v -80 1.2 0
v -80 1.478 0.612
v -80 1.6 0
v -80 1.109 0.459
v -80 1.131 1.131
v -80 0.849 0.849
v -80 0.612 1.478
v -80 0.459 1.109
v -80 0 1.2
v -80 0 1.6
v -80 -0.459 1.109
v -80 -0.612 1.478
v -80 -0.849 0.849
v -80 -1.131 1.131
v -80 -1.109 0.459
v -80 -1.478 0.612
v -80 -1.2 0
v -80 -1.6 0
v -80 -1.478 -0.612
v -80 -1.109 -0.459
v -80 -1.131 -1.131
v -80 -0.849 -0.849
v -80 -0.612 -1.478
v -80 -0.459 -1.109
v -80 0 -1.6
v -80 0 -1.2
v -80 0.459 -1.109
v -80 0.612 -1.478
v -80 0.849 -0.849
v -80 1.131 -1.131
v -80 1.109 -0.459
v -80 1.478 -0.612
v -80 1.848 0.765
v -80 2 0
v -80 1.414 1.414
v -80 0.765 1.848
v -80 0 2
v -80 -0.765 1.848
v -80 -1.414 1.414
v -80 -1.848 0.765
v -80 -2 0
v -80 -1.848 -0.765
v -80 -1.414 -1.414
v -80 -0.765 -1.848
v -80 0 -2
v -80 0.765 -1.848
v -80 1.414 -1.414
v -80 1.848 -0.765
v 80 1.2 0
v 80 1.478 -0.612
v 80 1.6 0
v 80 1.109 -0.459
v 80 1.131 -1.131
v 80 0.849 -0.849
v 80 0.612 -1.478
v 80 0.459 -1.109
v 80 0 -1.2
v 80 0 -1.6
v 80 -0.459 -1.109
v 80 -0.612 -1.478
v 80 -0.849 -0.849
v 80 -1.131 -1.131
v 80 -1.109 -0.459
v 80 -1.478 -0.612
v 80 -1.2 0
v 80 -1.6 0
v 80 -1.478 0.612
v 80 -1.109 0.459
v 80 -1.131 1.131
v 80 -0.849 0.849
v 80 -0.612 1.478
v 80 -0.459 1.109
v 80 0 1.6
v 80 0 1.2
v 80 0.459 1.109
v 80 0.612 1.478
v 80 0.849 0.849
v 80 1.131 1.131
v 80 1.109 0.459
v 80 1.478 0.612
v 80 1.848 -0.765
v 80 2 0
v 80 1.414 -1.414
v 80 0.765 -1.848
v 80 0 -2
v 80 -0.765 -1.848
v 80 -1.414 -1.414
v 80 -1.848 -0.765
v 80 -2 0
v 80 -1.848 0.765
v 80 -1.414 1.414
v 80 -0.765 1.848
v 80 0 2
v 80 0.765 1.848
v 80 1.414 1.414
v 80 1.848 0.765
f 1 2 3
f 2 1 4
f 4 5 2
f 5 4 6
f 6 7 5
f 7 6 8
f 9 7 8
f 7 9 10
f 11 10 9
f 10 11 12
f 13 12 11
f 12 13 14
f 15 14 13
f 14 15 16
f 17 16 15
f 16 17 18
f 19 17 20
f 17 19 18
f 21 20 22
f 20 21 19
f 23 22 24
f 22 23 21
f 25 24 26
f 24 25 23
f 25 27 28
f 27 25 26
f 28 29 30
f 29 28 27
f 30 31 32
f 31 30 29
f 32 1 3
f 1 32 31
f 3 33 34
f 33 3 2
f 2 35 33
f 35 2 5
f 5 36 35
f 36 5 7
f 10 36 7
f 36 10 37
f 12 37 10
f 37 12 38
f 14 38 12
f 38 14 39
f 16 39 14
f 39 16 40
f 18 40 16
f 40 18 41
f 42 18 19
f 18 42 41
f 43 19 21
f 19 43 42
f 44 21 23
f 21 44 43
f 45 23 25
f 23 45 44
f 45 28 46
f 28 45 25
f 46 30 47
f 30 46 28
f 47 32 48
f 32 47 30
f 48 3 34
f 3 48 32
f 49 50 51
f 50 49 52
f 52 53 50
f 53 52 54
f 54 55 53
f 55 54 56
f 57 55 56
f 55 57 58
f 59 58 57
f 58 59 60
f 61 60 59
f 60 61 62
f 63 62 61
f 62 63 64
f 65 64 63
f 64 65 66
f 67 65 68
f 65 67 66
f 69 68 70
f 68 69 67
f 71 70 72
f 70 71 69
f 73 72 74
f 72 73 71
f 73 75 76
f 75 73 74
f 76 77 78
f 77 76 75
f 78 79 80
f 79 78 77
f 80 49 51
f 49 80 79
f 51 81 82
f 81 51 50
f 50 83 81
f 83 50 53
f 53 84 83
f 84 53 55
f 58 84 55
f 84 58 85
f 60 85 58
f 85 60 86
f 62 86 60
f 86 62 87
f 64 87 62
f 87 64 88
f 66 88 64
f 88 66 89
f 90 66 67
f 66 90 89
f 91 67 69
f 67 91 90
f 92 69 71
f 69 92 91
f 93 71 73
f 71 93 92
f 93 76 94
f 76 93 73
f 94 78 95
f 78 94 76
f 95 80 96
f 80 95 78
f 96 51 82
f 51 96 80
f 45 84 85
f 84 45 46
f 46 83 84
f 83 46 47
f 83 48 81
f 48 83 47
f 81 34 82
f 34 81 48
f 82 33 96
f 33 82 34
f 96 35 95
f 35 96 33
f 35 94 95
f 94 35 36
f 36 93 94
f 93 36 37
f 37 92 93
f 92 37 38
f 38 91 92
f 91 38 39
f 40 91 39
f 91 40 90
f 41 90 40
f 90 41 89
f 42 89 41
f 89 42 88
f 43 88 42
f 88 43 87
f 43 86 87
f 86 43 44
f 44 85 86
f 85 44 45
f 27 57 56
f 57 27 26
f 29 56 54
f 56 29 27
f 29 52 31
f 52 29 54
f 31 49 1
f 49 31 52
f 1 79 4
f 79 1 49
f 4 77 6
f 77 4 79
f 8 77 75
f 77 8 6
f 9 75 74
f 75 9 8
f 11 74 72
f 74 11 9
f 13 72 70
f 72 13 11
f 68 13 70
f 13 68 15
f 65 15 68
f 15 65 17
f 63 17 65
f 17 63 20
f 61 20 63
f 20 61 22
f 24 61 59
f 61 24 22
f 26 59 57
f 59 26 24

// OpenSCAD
// file: ../p/4-4cyli.scad
use <../lib.scad>
function ldraw_lib__4_4cyli() = [
// 0 Cylinder 1.0
// 0 Name: 4-4cyli.dat
// 0 Author: James Jessiman
// 0 !LDRAW_ORG Primitive UPDATE 2005-01
// 0 !LICENSE Licensed under CC BY 2.0 and CC BY 4.0 : see CAreadme.txt
// 
// 0 BFC CERTIFY CCW
  [0,"BFC","CERTIFY"],
  [0,"BFC","CCW"],
// 
// 0 !HISTORY 1998-12-15 [PTadmin] Official Update 1998-10
// 0 !HISTORY 2002-03-23 [sbliss] Added BFC statement; merged headers from files in distributions LDraw 0.27 and Complete.
// 0 !HISTORY 2002-04-25 [PTadmin] Official Update 2002-02
// 0 !HISTORY 2004-12-14 [guyvivan] BFC CCW
// 0 !HISTORY 2005-12-28 [PTadmin] Official Update 2005-01
// 0 !HISTORY 2007-06-24 [PTadmin] Header formatted for Contributor Agreement
// 0 !HISTORY 2008-07-01 [PTadmin] Official Update 2008-01
// 
// 
// 4 16 1 1 0 0.9239 1 0.3827 0.9239 0 0.3827 1 0 0
  [4,16,1,1,0,0.9239,1,0.3827,0.9239,0,0.3827,1,0,0],
// 5 24 1 0 0 1 1 0 0.9239 0 0.3827 0.9239 0 -0.3827
  [5,24,1,0,0,1,1,0,0.9239,0,0.3827,0.9239,0,-0.3827],
// 4 16 0.9239 1 0.3827 0.7071 1 0.7071 0.7071 0 0.7071 0.9239 0 0.3827
  [4,16,0.9239,1,0.3827,0.7071,1,0.7071,0.7071,0,0.7071,0.9239,0,0.3827],
// 5 24 0.9239 0 0.3827 0.9239 1 0.3827 0.7071 0 0.7071 1 0 0
  [5,24,0.9239,0,0.3827,0.9239,1,0.3827,0.7071,0,0.7071,1,0,0],
// 4 16 0.7071 1 0.7071 0.3827 1 0.9239 0.3827 0 0.9239 0.7071 0 0.7071
  [4,16,0.7071,1,0.7071,0.3827,1,0.9239,0.3827,0,0.9239,0.7071,0,0.7071],
// 5 24 0.7071 0 0.7071 0.7071 1 0.7071 0.3827 0 0.9239 0.9239 0 0.3827
  [5,24,0.7071,0,0.7071,0.7071,1,0.7071,0.3827,0,0.9239,0.9239,0,0.3827],
// 4 16 0.3827 1 0.9239 0 1 1 0 0 1 0.3827 0 0.9239
  [4,16,0.3827,1,0.9239,0,1,1,0,0,1,0.3827,0,0.9239],
// 5 24 0.3827 0 0.9239 0.3827 1 0.9239 0 0 1 0.7071 0 0.7071
  [5,24,0.3827,0,0.9239,0.3827,1,0.9239,0,0,1,0.7071,0,0.7071],
// 4 16 0 1 1 -0.3827 1 0.9239 -0.3827 0 0.9239 0 0 1
  [4,16,0,1,1,-0.3827,1,0.9239,-0.3827,0,0.9239,0,0,1],
// 5 24 0 0 1 0 1 1 -0.3827 0 0.9239 0.3827 0 0.9239
  [5,24,0,0,1,0,1,1,-0.3827,0,0.9239,0.3827,0,0.9239],
// 4 16 -0.3827 1 0.9239 -0.7071 1 0.7071 -0.7071 0 0.7071 -0.3827 0 0.9239
  [4,16,-0.3827,1,0.9239,-0.7071,1,0.7071,-0.7071,0,0.7071,-0.3827,0,0.9239],
// 5 24 -0.3827 0 0.9239 -0.3827 1 0.9239 -0.7071 0 0.7071 0 0 1
  [5,24,-0.3827,0,0.9239,-0.3827,1,0.9239,-0.7071,0,0.7071,0,0,1],
// 4 16 -0.7071 1 0.7071 -0.9239 1 0.3827 -0.9239 0 0.3827 -0.7071 0 0.7071
  [4,16,-0.7071,1,0.7071,-0.9239,1,0.3827,-0.9239,0,0.3827,-0.7071,0,0.7071],
// 5 24 -0.7071 0 0.7071 -0.7071 1 0.7071 -0.9239 0 0.3827 -0.3827 0 0.9239
  [5,24,-0.7071,0,0.7071,-0.7071,1,0.7071,-0.9239,0,0.3827,-0.3827,0,0.9239],
// 4 16 -0.9239 1 0.3827 -1 1 0 -1 0 0 -0.9239 0 0.3827
  [4,16,-0.9239,1,0.3827,-1,1,0,-1,0,0,-0.9239,0,0.3827],
// 5 24 -0.9239 0 0.3827 -0.9239 1 0.3827 -1 0 0 -0.7071 0 0.7071
  [5,24,-0.9239,0,0.3827,-0.9239,1,0.3827,-1,0,0,-0.7071,0,0.7071],
// 4 16 -1 1 0 -0.9239 1 -0.3827 -0.9239 0 -0.3827 -1 0 0
  [4,16,-1,1,0,-0.9239,1,-0.3827,-0.9239,0,-0.3827,-1,0,0],
// 5 24 -1 0 0 -1 1 0 -0.9239 0 -0.3827 -0.9239 0 0.3827
  [5,24,-1,0,0,-1,1,0,-0.9239,0,-0.3827,-0.9239,0,0.3827],
// 4 16 -0.9239 1 -0.3827 -0.7071 1 -0.7071 -0.7071 0 -0.7071 -0.9239 0 -0.3827
  [4,16,-0.9239,1,-0.3827,-0.7071,1,-0.7071,-0.7071,0,-0.7071,-0.9239,0,-0.3827],
// 5 24 -0.9239 0 -0.3827 -0.9239 1 -0.3827 -0.7071 0 -0.7071 -1 0 0
  [5,24,-0.9239,0,-0.3827,-0.9239,1,-0.3827,-0.7071,0,-0.7071,-1,0,0],
// 4 16 -0.7071 1 -0.7071 -0.3827 1 -0.9239 -0.3827 0 -0.9239 -0.7071 0 -0.7071
  [4,16,-0.7071,1,-0.7071,-0.3827,1,-0.9239,-0.3827,0,-0.9239,-0.7071,0,-0.7071],
// 5 24 -0.7071 0 -0.7071 -0.7071 1 -0.7071 -0.3827 0 -0.9239 -0.9239 0 -0.3827
  [5,24,-0.7071,0,-0.7071,-0.7071,1,-0.7071,-0.3827,0,-0.9239,-0.9239,0,-0.3827],
// 4 16 -0.3827 1 -0.9239 0 1 -1 0 0 -1 -0.3827 0 -0.9239
  [4,16,-0.3827,1,-0.9239,0,1,-1,0,0,-1,-0.3827,0,-0.9239],
// 5 24 -0.3827 0 -0.9239 -0.3827 1 -0.9239 0 0 -1 -0.7071 0 -0.7071
  [5,24,-0.3827,0,-0.9239,-0.3827,1,-0.9239,0,0,-1,-0.7071,0,-0.7071],
// 4 16 0 1 -1 0.3827 1 -0.9239 0.3827 0 -0.9239 0 0 -1
  [4,16,0,1,-1,0.3827,1,-0.9239,0.3827,0,-0.9239,0,0,-1],
// 5 24 0 0 -1 0 1 -1 0.3827 0 -0.9239 -0.3827 0 -0.9239
  [5,24,0,0,-1,0,1,-1,0.3827,0,-0.9239,-0.3827,0,-0.9239],
// 4 16 0.3827 1 -0.9239 0.7071 1 -0.7071 0.7071 0 -0.7071 0.3827 0 -0.9239
  [4,16,0.3827,1,-0.9239,0.7071,1,-0.7071,0.7071,0,-0.7071,0.3827,0,-0.9239],
// 5 24 0.3827 0 -0.9239 0.3827 1 -0.9239 0.7071 0 -0.7071 0 0 -1
  [5,24,0.3827,0,-0.9239,0.3827,1,-0.9239,0.7071,0,-0.7071,0,0,-1],
// 4 16 0.7071 1 -0.7071 0.9239 1 -0.3827 0.9239 0 -0.3827 0.7071 0 -0.7071
  [4,16,0.7071,1,-0.7071,0.9239,1,-0.3827,0.9239,0,-0.3827,0.7071,0,-0.7071],
// 5 24 0.7071 0 -0.7071 0.7071 1 -0.7071 0.9239 0 -0.3827 0.3827 0 -0.9239
  [5,24,0.7071,0,-0.7071,0.7071,1,-0.7071,0.9239,0,-0.3827,0.3827,0,-0.9239],
// 4 16 0.9239 1 -0.3827 1 1 0 1 0 0 0.9239 0 -0.3827
  [4,16,0.9239,1,-0.3827,1,1,0,1,0,0,0.9239,0,-0.3827],
// 5 24 0.9239 0 -0.3827 0.9239 1 -0.3827 1 0 0 0.7071 0 -0.7071
  [5,24,0.9239,0,-0.3827,0.9239,1,-0.3827,1,0,0,0.7071,0,-0.7071],
// 0
];
module ldraw_lib__4_4cyli(step=0, col=false, unit=2/5, alt=false, line=0.2, solid=!$preview)
    makepoly(ldraw_lib__4_4cyli(), step=step, col=col, unit=unit, alt=alt, line=line, solid=solid);
ldraw_lib__4_4cyli(line=0.2);
// file: ../p/4-4ring4.scad
use <../lib.scad>
function ldraw_lib__4_4ring4() = [
// 0 Ring  4 x 1.0
// 0 Name: 4-4ring4.dat
// 0 Author: James Jessiman
// 0 !LDRAW_ORG Primitive UPDATE 2009-01
// 0 !LICENSE Licensed under CC BY 2.0 and CC BY 4.0 : see CAreadme.txt
// 
// 0 BFC CERTIFY CCW
  [0,"BFC","CERTIFY"],
  [0,"BFC","CCW"],
// 
// 0 !HISTORY 1998-12-15 [PTadmin] Official Update 1998-10
// 0 !HISTORY 2002-04-08 [BrickCaster] Modified for BFC compliance
// 0 !HISTORY 2002-04-25 [PTadmin] Official Update 2002-02
// 0 !HISTORY 2007-06-24 [PTadmin] Header formatted for Contributor Agreement
// 0 !HISTORY 2008-07-01 [PTadmin] Official Update 2008-01
// 0 !HISTORY 2008-08-26 [cwdee] Switch polygon winding and rename
// 0 !HISTORY 2009-05-02 [PTadmin] Official Update 2009-01
// 
// 
// 4 16 -1.9135 0 4.6195 -1.5308 0 3.6956 0 0 4 0 0 5
  [4,16,-1.9135,0,4.6195,-1.5308,0,3.6956,0,0,4,0,0,5],
// 4 16 -3.5355 0 3.5355 -2.8284 0 2.8284 -1.5308 0 3.6956 -1.9135 0 4.6195
  [4,16,-3.5355,0,3.5355,-2.8284,0,2.8284,-1.5308,0,3.6956,-1.9135,0,4.6195],
// 4 16 -4.6195 0 1.9135 -3.6956 0 1.5308 -2.8284 0 2.8284 -3.5355 0 3.5355
  [4,16,-4.6195,0,1.9135,-3.6956,0,1.5308,-2.8284,0,2.8284,-3.5355,0,3.5355],
// 4 16 -5 0 0 -4 0 0 -3.6956 0 1.5308 -4.6195 0 1.9135
  [4,16,-5,0,0,-4,0,0,-3.6956,0,1.5308,-4.6195,0,1.9135],
// 4 16 -4.6195 0 -1.9135 -3.6956 0 -1.5308 -4 0 0 -5 0 0
  [4,16,-4.6195,0,-1.9135,-3.6956,0,-1.5308,-4,0,0,-5,0,0],
// 4 16 -3.5355 0 -3.5355 -2.8284 0 -2.8284 -3.6956 0 -1.5308 -4.6195 0 -1.9135
  [4,16,-3.5355,0,-3.5355,-2.8284,0,-2.8284,-3.6956,0,-1.5308,-4.6195,0,-1.9135],
// 4 16 -1.9135 0 -4.6195 -1.5308 0 -3.6956 -2.8284 0 -2.8284 -3.5355 0 -3.5355
  [4,16,-1.9135,0,-4.6195,-1.5308,0,-3.6956,-2.8284,0,-2.8284,-3.5355,0,-3.5355],
// 4 16 0 0 -5 0 0 -4 -1.5308 0 -3.6956 -1.9135 0 -4.6195
  [4,16,0,0,-5,0,0,-4,-1.5308,0,-3.6956,-1.9135,0,-4.6195],
// 4 16 1.9135 0 -4.6195 1.5308 0 -3.6956 0 0 -4 0 0 -5
  [4,16,1.9135,0,-4.6195,1.5308,0,-3.6956,0,0,-4,0,0,-5],
// 4 16 3.5355 0 -3.5355 2.8284 0 -2.8284 1.5308 0 -3.6956 1.9135 0 -4.6195
  [4,16,3.5355,0,-3.5355,2.8284,0,-2.8284,1.5308,0,-3.6956,1.9135,0,-4.6195],
// 4 16 4.6195 0 -1.9135 3.6956 0 -1.5308 2.8284 0 -2.8284 3.5355 0 -3.5355
  [4,16,4.6195,0,-1.9135,3.6956,0,-1.5308,2.8284,0,-2.8284,3.5355,0,-3.5355],
// 4 16 5 0 0 4 0 0 3.6956 0 -1.5308 4.6195 0 -1.9135
  [4,16,5,0,0,4,0,0,3.6956,0,-1.5308,4.6195,0,-1.9135],
// 4 16 4.6195 0 1.9135 3.6956 0 1.5308 4 0 0 5 0 0
  [4,16,4.6195,0,1.9135,3.6956,0,1.5308,4,0,0,5,0,0],
// 4 16 3.5355 0 3.5355 2.8284 0 2.8284 3.6956 0 1.5308 4.6195 0 1.9135
  [4,16,3.5355,0,3.5355,2.8284,0,2.8284,3.6956,0,1.5308,4.6195,0,1.9135],
// 4 16 1.9135 0 4.6195 1.5308 0 3.6956 2.8284 0 2.8284 3.5355 0 3.5355
  [4,16,1.9135,0,4.6195,1.5308,0,3.6956,2.8284,0,2.8284,3.5355,0,3.5355],
// 4 16 0 0 5 0 0 4 1.5308 0 3.6956 1.9135 0 4.6195
  [4,16,0,0,5,0,0,4,1.5308,0,3.6956,1.9135,0,4.6195],
// 0
];
module ldraw_lib__4_4ring4(step=0, col=false, unit=2/5, alt=false, line=0.2, solid=!$preview)
    makepoly(ldraw_lib__4_4ring4(), step=step, col=col, unit=unit, alt=alt, line=line, solid=solid);
ldraw_lib__4_4ring4(line=0.2);
// file: ../p/4-4ring3.scad
use <../lib.scad>
function ldraw_lib__4_4ring3() = [
// 0 Ring  3 x 1.0
// 0 Name: 4-4ring3.dat
// 0 Author: James Jessiman
// 0 !LDRAW_ORG Primitive UPDATE 2009-01
// 0 !LICENSE Licensed under CC BY 2.0 and CC BY 4.0 : see CAreadme.txt
// 
// 0 BFC CERTIFY CCW
  [0,"BFC","CERTIFY"],
  [0,"BFC","CCW"],
// 
// 0 !HISTORY 1998-12-15 [PTadmin] Official Update 1998-10
// 0 !HISTORY 2002-04-05 [hafhead] Added BFC statement
// 0 !HISTORY 2002-04-25 [PTadmin] Official Update 2002-02
// 0 !HISTORY 2007-06-24 [PTadmin] Header formatted for Contributor Agreement
// 0 !HISTORY 2008-07-01 [PTadmin] Official Update 2008-01
// 0 !HISTORY 2008-08-26 [cwdee] Switch polygon winding and rename
// 0 !HISTORY 2009-05-02 [PTadmin] Official Update 2009-01
// 
// 
// 4 16 -1.5308 0 3.6956 -1.1481 0 2.7717 0 0 3 0 0 4
  [4,16,-1.5308,0,3.6956,-1.1481,0,2.7717,0,0,3,0,0,4],
// 4 16 -2.8284 0 2.8284 -2.1213 0 2.1213 -1.1481 0 2.7717 -1.5308 0 3.6956
  [4,16,-2.8284,0,2.8284,-2.1213,0,2.1213,-1.1481,0,2.7717,-1.5308,0,3.6956],
// 4 16 -3.6956 0 1.5308 -2.7717 0 1.1481 -2.1213 0 2.1213 -2.8284 0 2.8284
  [4,16,-3.6956,0,1.5308,-2.7717,0,1.1481,-2.1213,0,2.1213,-2.8284,0,2.8284],
// 4 16 -4 0 0 -3 0 0 -2.7717 0 1.1481 -3.6956 0 1.5308
  [4,16,-4,0,0,-3,0,0,-2.7717,0,1.1481,-3.6956,0,1.5308],
// 4 16 -3.6956 0 -1.5308 -2.7717 0 -1.1481 -3 0 0 -4 0 0
  [4,16,-3.6956,0,-1.5308,-2.7717,0,-1.1481,-3,0,0,-4,0,0],
// 4 16 -2.8284 0 -2.8284 -2.1213 0 -2.1213 -2.7717 0 -1.1481 -3.6956 0 -1.5308
  [4,16,-2.8284,0,-2.8284,-2.1213,0,-2.1213,-2.7717,0,-1.1481,-3.6956,0,-1.5308],
// 4 16 -1.5308 0 -3.6956 -1.1481 0 -2.7717 -2.1213 0 -2.1213 -2.8284 0 -2.8284
  [4,16,-1.5308,0,-3.6956,-1.1481,0,-2.7717,-2.1213,0,-2.1213,-2.8284,0,-2.8284],
// 4 16 0 0 -4 0 0 -3 -1.1481 0 -2.7717 -1.5308 0 -3.6956
  [4,16,0,0,-4,0,0,-3,-1.1481,0,-2.7717,-1.5308,0,-3.6956],
// 4 16 1.5308 0 -3.6956 1.1481 0 -2.7717 0 0 -3 0 0 -4
  [4,16,1.5308,0,-3.6956,1.1481,0,-2.7717,0,0,-3,0,0,-4],
// 4 16 2.8284 0 -2.8284 2.1213 0 -2.1213 1.1481 0 -2.7717 1.5308 0 -3.6956
  [4,16,2.8284,0,-2.8284,2.1213,0,-2.1213,1.1481,0,-2.7717,1.5308,0,-3.6956],
// 4 16 3.6956 0 -1.5308 2.7717 0 -1.1481 2.1213 0 -2.1213 2.8284 0 -2.8284
  [4,16,3.6956,0,-1.5308,2.7717,0,-1.1481,2.1213,0,-2.1213,2.8284,0,-2.8284],
// 4 16 4 0 0 3 0 0 2.7717 0 -1.1481 3.6956 0 -1.5308
  [4,16,4,0,0,3,0,0,2.7717,0,-1.1481,3.6956,0,-1.5308],
// 4 16 3.6956 0 1.5308 2.7717 0 1.1481 3 0 0 4 0 0
  [4,16,3.6956,0,1.5308,2.7717,0,1.1481,3,0,0,4,0,0],
// 4 16 2.8284 0 2.8284 2.1213 0 2.1213 2.7717 0 1.1481 3.6956 0 1.5308
  [4,16,2.8284,0,2.8284,2.1213,0,2.1213,2.7717,0,1.1481,3.6956,0,1.5308],
// 4 16 1.5308 0 3.6956 1.1481 0 2.7717 2.1213 0 2.1213 2.8284 0 2.8284
  [4,16,1.5308,0,3.6956,1.1481,0,2.7717,2.1213,0,2.1213,2.8284,0,2.8284],
// 4 16 0 0 4 0 0 3 1.1481 0 2.7717 1.5308 0 3.6956
  [4,16,0,0,4,0,0,3,1.1481,0,2.7717,1.5308,0,3.6956],
// 0
];
module ldraw_lib__4_4ring3(step=0, col=false, unit=2/5, alt=false, line=0.2, solid=!$preview)
    makepoly(ldraw_lib__4_4ring3(), step=step, col=col, unit=unit, alt=alt, line=line, solid=solid);
ldraw_lib__4_4ring3(line=0.2);
// file: ../p/4-4edge.scad
use <../lib.scad>
function ldraw_lib__4_4edge() = [
// 0 Circle 1.0
// 0 Name: 4-4edge.dat
// 0 Author: James Jessiman
// 0 !LDRAW_ORG Primitive UPDATE 2017-01
// 0 !LICENSE Licensed under CC BY 4.0 : see CAreadme.txt
// 
// 0 BFC CERTIFY CCW
  [0,"BFC","CERTIFY"],
  [0,"BFC","CCW"],
// 
// 0 !HISTORY 1998-12-15 [PTadmin] Official Update 1998-10
// 0 !HISTORY 2005-12-28 [PTadmin] Official Update 2005-01
// 0 !HISTORY 2007-06-24 [PTadmin] Header formatted for Contributor Agreement
// 0 !HISTORY 2008-07-01 [PTadmin] Official Update 2008-01
// 0 !HISTORY 2017-01-15 [Steffen] BFCed
// 0 !HISTORY 2017-12-30 [PTadmin] Official Update 2017-01
// 
// 
// 2 24 1 0 0 0.9239 0 0.3827
  [2,24,1,0,0,0.9239,0,0.3827],
// 2 24 0.9239 0 0.3827 0.7071 0 0.7071
  [2,24,0.9239,0,0.3827,0.7071,0,0.7071],
// 2 24 0.7071 0 0.7071 0.3827 0 0.9239
  [2,24,0.7071,0,0.7071,0.3827,0,0.9239],
// 2 24 0.3827 0 0.9239 0 0 1
  [2,24,0.3827,0,0.9239,0,0,1],
// 2 24 0 0 1 -0.3827 0 0.9239
  [2,24,0,0,1,-0.3827,0,0.9239],
// 2 24 -0.3827 0 0.9239 -0.7071 0 0.7071
  [2,24,-0.3827,0,0.9239,-0.7071,0,0.7071],
// 2 24 -0.7071 0 0.7071 -0.9239 0 0.3827
  [2,24,-0.7071,0,0.7071,-0.9239,0,0.3827],
// 2 24 -0.9239 0 0.3827 -1 0 -0
  [2,24,-0.9239,0,0.3827,-1,0,-0],
// 2 24 -1 0 -0 -0.9239 0 -0.3827
  [2,24,-1,0,-0,-0.9239,0,-0.3827],
// 2 24 -0.9239 0 -0.3827 -0.7071 0 -0.7071
  [2,24,-0.9239,0,-0.3827,-0.7071,0,-0.7071],
// 2 24 -0.7071 0 -0.7071 -0.3827 0 -0.9239
  [2,24,-0.7071,0,-0.7071,-0.3827,0,-0.9239],
// 2 24 -0.3827 0 -0.9239 0 0 -1
  [2,24,-0.3827,0,-0.9239,0,0,-1],
// 2 24 0 0 -1 0.3827 0 -0.9239
  [2,24,0,0,-1,0.3827,0,-0.9239],
// 2 24 0.3827 0 -0.9239 0.7071 0 -0.7071
  [2,24,0.3827,0,-0.9239,0.7071,0,-0.7071],
// 2 24 0.7071 0 -0.7071 0.9239 0 -0.3827
  [2,24,0.7071,0,-0.7071,0.9239,0,-0.3827],
// 2 24 0.9239 0 -0.3827 1 0 0
  [2,24,0.9239,0,-0.3827,1,0,0],
];
module ldraw_lib__4_4edge(step=0, col=false, unit=2/5, alt=false, line=0.2, solid=!$preview)
    makepoly(ldraw_lib__4_4edge(), step=step, col=col, unit=unit, alt=alt, line=line, solid=solid);
ldraw_lib__4_4edge(line=0.2);
// file: 71533k03.scad
use <../lib.scad>
use <../p/4-4cyli.scad>
function ldraw_lib__71533k03() = [
// 0 ~Technic Pneumatic Tube Segment
// 0 Name: 71533k03.dat
// 0 Author: Jaco van der Molen [Jaco]
// 0 !LDRAW_ORG Part Flexible_Section UPDATE 2020-01
// 0 !LICENSE Licensed under CC BY 4.0 : see CAreadme.txt
// 
// 0 BFC CERTIFY CW
  [0,"BFC","CERTIFY"],
  [0,"BFC","CW"],
// 
// 0 !HISTORY 2003-11-30 [Steffen] BFCed
// 0 !HISTORY 2009-12-29 [PTadmin] Official Update 2009-03
// 0 !HISTORY 2020-06-27 [PTadmin] Renamed from 166
// 0 !HISTORY 2020-06-28 [PTadmin] Official Update 2020-01
// 
// 
// 1 16 0 0 0 5 0 0 0 1 0 0 0 5 4-4cyli.dat
  [1,16,0,0,0,5,0,0,0,1,0,0,0,5, ldraw_lib__4_4cyli()],
// 0 BFC INVERTNEXT
  [0,"BFC","INVERTNEXT"],
// 1 16 0 0 0 3 0 0 0 1 0 0 0 3 4-4cyli.dat
  [1,16,0,0,0,3,0,0,0,1,0,0,0,3, ldraw_lib__4_4cyli()],
// 0
];
module ldraw_lib__71533k03(step=0, col=false, unit=2/5, alt=false, line=0.2, solid=!$preview)
    makepoly(ldraw_lib__71533k03(), step=step, col=col, unit=unit, alt=alt, line=line, solid=solid);
ldraw_lib__71533k03(line=0.2);
// file: 71533k02.scad
use <../lib.scad>
use <../p/4-4edge.scad>
use <../p/4-4ring3.scad>
use <../p/4-4ring4.scad>
function ldraw_lib__71533k02() = [
// 0 ~Technic Pneumatic Tube End (Non-Bulged)
// 0 Name: 71533k02.dat
// 0 Author: Steffen [Steffen]
// 0 !LDRAW_ORG Part Flexible_Section UPDATE 2020-01
// 0 !LICENSE Licensed under CC BY 4.0 : see CAreadme.txt
// 
// 0 BFC CERTIFY CCW
  [0,"BFC","CERTIFY"],
  [0,"BFC","CCW"],
// 
// 0 !HISTORY 2020-06-28 [PTadmin] Official Update 2020-01
// 
// 
// 0 // This file goes together with 71533k01.dat and 71533k03.dat.
// 0 // Those 3 files can be used to create Technic Pneumatic Tubes
// 0 // with either bulged or non-bulged ends.
// 
// 1 16 0 0 0 1 0 0 0 1 0 0 0 1 4-4ring3.dat
  [1,16,0,0,0,1,0,0,0,1,0,0,0,1, ldraw_lib__4_4ring3()],
// 1 16 0 0 0 1 0 0 0 1 0 0 0 1 4-4ring4.dat
  [1,16,0,0,0,1,0,0,0,1,0,0,0,1, ldraw_lib__4_4ring4()],
// 1 16 0 0 0 3 0 0 0 3 0 0 0 3 4-4edge.dat
  [1,16,0,0,0,3,0,0,0,3,0,0,0,3, ldraw_lib__4_4edge()],
// 1 16 0 0 0 5 0 0 0 5 0 0 0 5 4-4edge.dat
  [1,16,0,0,0,5,0,0,0,5,0,0,0,5, ldraw_lib__4_4edge()],
];
module ldraw_lib__71533k02(step=0, col=false, unit=2/5, alt=false, line=0.2, solid=!$preview)
    makepoly(ldraw_lib__71533k02(), step=step, col=col, unit=unit, alt=alt, line=line, solid=solid);
ldraw_lib__71533k02(line=0.2);
// main file
use <../lib.scad>
use <71533k02.scad>
use <71533k03.scad>
function ldraw_lib__87950_f1() = [
// 0 Technic Pneumatic Tube 20L
// 0 Name: 87950-f1.dat
// 0 Author: Philippe Hurbain [Philo]
// 0 !LDRAW_ORG Part UPDATE 2020-02
// 0 !LICENSE Licensed under CC BY 4.0 : see CAreadme.txt
// 
// 0 BFC CERTIFY CCW
  [0,"BFC","CERTIFY"],
  [0,"BFC","CCW"],
// 
// 0 !KEYWORDS 160 mm
// 
// 0 !HISTORY 2020-09-05 [PTadmin] Official Update 2020-02
// 
// 
// 1 16 -200 0 0 0 1 0 1 0 0 0 0 1 71533k02.dat
  [1,16,-200,0,0,0,1,0,1,0,0,0,0,1, ldraw_lib__71533k02()],
// 1 16 200 0 0 0 -1 0 -1 0 0 0 0 1 71533k02.dat
  [1,16,200,0,0,0,-1,0,-1,0,0,0,0,1, ldraw_lib__71533k02()],
// 1 16 -200 0 0 0 400 0 1 0 0 0 0 1 71533k03.dat
  [1,16,-200,0,0,0,400,0,1,0,0,0,0,1, ldraw_lib__71533k03()],
];
module ldraw_lib__87950_f1(step=0, col=false, unit=2/5, alt=false, line=0.2, solid=!$preview)
    makepoly(ldraw_lib__87950_f1(), step=step, col=col, unit=unit, alt=alt, line=line, solid=solid);
ldraw_lib__87950_f1(line=0.2);
